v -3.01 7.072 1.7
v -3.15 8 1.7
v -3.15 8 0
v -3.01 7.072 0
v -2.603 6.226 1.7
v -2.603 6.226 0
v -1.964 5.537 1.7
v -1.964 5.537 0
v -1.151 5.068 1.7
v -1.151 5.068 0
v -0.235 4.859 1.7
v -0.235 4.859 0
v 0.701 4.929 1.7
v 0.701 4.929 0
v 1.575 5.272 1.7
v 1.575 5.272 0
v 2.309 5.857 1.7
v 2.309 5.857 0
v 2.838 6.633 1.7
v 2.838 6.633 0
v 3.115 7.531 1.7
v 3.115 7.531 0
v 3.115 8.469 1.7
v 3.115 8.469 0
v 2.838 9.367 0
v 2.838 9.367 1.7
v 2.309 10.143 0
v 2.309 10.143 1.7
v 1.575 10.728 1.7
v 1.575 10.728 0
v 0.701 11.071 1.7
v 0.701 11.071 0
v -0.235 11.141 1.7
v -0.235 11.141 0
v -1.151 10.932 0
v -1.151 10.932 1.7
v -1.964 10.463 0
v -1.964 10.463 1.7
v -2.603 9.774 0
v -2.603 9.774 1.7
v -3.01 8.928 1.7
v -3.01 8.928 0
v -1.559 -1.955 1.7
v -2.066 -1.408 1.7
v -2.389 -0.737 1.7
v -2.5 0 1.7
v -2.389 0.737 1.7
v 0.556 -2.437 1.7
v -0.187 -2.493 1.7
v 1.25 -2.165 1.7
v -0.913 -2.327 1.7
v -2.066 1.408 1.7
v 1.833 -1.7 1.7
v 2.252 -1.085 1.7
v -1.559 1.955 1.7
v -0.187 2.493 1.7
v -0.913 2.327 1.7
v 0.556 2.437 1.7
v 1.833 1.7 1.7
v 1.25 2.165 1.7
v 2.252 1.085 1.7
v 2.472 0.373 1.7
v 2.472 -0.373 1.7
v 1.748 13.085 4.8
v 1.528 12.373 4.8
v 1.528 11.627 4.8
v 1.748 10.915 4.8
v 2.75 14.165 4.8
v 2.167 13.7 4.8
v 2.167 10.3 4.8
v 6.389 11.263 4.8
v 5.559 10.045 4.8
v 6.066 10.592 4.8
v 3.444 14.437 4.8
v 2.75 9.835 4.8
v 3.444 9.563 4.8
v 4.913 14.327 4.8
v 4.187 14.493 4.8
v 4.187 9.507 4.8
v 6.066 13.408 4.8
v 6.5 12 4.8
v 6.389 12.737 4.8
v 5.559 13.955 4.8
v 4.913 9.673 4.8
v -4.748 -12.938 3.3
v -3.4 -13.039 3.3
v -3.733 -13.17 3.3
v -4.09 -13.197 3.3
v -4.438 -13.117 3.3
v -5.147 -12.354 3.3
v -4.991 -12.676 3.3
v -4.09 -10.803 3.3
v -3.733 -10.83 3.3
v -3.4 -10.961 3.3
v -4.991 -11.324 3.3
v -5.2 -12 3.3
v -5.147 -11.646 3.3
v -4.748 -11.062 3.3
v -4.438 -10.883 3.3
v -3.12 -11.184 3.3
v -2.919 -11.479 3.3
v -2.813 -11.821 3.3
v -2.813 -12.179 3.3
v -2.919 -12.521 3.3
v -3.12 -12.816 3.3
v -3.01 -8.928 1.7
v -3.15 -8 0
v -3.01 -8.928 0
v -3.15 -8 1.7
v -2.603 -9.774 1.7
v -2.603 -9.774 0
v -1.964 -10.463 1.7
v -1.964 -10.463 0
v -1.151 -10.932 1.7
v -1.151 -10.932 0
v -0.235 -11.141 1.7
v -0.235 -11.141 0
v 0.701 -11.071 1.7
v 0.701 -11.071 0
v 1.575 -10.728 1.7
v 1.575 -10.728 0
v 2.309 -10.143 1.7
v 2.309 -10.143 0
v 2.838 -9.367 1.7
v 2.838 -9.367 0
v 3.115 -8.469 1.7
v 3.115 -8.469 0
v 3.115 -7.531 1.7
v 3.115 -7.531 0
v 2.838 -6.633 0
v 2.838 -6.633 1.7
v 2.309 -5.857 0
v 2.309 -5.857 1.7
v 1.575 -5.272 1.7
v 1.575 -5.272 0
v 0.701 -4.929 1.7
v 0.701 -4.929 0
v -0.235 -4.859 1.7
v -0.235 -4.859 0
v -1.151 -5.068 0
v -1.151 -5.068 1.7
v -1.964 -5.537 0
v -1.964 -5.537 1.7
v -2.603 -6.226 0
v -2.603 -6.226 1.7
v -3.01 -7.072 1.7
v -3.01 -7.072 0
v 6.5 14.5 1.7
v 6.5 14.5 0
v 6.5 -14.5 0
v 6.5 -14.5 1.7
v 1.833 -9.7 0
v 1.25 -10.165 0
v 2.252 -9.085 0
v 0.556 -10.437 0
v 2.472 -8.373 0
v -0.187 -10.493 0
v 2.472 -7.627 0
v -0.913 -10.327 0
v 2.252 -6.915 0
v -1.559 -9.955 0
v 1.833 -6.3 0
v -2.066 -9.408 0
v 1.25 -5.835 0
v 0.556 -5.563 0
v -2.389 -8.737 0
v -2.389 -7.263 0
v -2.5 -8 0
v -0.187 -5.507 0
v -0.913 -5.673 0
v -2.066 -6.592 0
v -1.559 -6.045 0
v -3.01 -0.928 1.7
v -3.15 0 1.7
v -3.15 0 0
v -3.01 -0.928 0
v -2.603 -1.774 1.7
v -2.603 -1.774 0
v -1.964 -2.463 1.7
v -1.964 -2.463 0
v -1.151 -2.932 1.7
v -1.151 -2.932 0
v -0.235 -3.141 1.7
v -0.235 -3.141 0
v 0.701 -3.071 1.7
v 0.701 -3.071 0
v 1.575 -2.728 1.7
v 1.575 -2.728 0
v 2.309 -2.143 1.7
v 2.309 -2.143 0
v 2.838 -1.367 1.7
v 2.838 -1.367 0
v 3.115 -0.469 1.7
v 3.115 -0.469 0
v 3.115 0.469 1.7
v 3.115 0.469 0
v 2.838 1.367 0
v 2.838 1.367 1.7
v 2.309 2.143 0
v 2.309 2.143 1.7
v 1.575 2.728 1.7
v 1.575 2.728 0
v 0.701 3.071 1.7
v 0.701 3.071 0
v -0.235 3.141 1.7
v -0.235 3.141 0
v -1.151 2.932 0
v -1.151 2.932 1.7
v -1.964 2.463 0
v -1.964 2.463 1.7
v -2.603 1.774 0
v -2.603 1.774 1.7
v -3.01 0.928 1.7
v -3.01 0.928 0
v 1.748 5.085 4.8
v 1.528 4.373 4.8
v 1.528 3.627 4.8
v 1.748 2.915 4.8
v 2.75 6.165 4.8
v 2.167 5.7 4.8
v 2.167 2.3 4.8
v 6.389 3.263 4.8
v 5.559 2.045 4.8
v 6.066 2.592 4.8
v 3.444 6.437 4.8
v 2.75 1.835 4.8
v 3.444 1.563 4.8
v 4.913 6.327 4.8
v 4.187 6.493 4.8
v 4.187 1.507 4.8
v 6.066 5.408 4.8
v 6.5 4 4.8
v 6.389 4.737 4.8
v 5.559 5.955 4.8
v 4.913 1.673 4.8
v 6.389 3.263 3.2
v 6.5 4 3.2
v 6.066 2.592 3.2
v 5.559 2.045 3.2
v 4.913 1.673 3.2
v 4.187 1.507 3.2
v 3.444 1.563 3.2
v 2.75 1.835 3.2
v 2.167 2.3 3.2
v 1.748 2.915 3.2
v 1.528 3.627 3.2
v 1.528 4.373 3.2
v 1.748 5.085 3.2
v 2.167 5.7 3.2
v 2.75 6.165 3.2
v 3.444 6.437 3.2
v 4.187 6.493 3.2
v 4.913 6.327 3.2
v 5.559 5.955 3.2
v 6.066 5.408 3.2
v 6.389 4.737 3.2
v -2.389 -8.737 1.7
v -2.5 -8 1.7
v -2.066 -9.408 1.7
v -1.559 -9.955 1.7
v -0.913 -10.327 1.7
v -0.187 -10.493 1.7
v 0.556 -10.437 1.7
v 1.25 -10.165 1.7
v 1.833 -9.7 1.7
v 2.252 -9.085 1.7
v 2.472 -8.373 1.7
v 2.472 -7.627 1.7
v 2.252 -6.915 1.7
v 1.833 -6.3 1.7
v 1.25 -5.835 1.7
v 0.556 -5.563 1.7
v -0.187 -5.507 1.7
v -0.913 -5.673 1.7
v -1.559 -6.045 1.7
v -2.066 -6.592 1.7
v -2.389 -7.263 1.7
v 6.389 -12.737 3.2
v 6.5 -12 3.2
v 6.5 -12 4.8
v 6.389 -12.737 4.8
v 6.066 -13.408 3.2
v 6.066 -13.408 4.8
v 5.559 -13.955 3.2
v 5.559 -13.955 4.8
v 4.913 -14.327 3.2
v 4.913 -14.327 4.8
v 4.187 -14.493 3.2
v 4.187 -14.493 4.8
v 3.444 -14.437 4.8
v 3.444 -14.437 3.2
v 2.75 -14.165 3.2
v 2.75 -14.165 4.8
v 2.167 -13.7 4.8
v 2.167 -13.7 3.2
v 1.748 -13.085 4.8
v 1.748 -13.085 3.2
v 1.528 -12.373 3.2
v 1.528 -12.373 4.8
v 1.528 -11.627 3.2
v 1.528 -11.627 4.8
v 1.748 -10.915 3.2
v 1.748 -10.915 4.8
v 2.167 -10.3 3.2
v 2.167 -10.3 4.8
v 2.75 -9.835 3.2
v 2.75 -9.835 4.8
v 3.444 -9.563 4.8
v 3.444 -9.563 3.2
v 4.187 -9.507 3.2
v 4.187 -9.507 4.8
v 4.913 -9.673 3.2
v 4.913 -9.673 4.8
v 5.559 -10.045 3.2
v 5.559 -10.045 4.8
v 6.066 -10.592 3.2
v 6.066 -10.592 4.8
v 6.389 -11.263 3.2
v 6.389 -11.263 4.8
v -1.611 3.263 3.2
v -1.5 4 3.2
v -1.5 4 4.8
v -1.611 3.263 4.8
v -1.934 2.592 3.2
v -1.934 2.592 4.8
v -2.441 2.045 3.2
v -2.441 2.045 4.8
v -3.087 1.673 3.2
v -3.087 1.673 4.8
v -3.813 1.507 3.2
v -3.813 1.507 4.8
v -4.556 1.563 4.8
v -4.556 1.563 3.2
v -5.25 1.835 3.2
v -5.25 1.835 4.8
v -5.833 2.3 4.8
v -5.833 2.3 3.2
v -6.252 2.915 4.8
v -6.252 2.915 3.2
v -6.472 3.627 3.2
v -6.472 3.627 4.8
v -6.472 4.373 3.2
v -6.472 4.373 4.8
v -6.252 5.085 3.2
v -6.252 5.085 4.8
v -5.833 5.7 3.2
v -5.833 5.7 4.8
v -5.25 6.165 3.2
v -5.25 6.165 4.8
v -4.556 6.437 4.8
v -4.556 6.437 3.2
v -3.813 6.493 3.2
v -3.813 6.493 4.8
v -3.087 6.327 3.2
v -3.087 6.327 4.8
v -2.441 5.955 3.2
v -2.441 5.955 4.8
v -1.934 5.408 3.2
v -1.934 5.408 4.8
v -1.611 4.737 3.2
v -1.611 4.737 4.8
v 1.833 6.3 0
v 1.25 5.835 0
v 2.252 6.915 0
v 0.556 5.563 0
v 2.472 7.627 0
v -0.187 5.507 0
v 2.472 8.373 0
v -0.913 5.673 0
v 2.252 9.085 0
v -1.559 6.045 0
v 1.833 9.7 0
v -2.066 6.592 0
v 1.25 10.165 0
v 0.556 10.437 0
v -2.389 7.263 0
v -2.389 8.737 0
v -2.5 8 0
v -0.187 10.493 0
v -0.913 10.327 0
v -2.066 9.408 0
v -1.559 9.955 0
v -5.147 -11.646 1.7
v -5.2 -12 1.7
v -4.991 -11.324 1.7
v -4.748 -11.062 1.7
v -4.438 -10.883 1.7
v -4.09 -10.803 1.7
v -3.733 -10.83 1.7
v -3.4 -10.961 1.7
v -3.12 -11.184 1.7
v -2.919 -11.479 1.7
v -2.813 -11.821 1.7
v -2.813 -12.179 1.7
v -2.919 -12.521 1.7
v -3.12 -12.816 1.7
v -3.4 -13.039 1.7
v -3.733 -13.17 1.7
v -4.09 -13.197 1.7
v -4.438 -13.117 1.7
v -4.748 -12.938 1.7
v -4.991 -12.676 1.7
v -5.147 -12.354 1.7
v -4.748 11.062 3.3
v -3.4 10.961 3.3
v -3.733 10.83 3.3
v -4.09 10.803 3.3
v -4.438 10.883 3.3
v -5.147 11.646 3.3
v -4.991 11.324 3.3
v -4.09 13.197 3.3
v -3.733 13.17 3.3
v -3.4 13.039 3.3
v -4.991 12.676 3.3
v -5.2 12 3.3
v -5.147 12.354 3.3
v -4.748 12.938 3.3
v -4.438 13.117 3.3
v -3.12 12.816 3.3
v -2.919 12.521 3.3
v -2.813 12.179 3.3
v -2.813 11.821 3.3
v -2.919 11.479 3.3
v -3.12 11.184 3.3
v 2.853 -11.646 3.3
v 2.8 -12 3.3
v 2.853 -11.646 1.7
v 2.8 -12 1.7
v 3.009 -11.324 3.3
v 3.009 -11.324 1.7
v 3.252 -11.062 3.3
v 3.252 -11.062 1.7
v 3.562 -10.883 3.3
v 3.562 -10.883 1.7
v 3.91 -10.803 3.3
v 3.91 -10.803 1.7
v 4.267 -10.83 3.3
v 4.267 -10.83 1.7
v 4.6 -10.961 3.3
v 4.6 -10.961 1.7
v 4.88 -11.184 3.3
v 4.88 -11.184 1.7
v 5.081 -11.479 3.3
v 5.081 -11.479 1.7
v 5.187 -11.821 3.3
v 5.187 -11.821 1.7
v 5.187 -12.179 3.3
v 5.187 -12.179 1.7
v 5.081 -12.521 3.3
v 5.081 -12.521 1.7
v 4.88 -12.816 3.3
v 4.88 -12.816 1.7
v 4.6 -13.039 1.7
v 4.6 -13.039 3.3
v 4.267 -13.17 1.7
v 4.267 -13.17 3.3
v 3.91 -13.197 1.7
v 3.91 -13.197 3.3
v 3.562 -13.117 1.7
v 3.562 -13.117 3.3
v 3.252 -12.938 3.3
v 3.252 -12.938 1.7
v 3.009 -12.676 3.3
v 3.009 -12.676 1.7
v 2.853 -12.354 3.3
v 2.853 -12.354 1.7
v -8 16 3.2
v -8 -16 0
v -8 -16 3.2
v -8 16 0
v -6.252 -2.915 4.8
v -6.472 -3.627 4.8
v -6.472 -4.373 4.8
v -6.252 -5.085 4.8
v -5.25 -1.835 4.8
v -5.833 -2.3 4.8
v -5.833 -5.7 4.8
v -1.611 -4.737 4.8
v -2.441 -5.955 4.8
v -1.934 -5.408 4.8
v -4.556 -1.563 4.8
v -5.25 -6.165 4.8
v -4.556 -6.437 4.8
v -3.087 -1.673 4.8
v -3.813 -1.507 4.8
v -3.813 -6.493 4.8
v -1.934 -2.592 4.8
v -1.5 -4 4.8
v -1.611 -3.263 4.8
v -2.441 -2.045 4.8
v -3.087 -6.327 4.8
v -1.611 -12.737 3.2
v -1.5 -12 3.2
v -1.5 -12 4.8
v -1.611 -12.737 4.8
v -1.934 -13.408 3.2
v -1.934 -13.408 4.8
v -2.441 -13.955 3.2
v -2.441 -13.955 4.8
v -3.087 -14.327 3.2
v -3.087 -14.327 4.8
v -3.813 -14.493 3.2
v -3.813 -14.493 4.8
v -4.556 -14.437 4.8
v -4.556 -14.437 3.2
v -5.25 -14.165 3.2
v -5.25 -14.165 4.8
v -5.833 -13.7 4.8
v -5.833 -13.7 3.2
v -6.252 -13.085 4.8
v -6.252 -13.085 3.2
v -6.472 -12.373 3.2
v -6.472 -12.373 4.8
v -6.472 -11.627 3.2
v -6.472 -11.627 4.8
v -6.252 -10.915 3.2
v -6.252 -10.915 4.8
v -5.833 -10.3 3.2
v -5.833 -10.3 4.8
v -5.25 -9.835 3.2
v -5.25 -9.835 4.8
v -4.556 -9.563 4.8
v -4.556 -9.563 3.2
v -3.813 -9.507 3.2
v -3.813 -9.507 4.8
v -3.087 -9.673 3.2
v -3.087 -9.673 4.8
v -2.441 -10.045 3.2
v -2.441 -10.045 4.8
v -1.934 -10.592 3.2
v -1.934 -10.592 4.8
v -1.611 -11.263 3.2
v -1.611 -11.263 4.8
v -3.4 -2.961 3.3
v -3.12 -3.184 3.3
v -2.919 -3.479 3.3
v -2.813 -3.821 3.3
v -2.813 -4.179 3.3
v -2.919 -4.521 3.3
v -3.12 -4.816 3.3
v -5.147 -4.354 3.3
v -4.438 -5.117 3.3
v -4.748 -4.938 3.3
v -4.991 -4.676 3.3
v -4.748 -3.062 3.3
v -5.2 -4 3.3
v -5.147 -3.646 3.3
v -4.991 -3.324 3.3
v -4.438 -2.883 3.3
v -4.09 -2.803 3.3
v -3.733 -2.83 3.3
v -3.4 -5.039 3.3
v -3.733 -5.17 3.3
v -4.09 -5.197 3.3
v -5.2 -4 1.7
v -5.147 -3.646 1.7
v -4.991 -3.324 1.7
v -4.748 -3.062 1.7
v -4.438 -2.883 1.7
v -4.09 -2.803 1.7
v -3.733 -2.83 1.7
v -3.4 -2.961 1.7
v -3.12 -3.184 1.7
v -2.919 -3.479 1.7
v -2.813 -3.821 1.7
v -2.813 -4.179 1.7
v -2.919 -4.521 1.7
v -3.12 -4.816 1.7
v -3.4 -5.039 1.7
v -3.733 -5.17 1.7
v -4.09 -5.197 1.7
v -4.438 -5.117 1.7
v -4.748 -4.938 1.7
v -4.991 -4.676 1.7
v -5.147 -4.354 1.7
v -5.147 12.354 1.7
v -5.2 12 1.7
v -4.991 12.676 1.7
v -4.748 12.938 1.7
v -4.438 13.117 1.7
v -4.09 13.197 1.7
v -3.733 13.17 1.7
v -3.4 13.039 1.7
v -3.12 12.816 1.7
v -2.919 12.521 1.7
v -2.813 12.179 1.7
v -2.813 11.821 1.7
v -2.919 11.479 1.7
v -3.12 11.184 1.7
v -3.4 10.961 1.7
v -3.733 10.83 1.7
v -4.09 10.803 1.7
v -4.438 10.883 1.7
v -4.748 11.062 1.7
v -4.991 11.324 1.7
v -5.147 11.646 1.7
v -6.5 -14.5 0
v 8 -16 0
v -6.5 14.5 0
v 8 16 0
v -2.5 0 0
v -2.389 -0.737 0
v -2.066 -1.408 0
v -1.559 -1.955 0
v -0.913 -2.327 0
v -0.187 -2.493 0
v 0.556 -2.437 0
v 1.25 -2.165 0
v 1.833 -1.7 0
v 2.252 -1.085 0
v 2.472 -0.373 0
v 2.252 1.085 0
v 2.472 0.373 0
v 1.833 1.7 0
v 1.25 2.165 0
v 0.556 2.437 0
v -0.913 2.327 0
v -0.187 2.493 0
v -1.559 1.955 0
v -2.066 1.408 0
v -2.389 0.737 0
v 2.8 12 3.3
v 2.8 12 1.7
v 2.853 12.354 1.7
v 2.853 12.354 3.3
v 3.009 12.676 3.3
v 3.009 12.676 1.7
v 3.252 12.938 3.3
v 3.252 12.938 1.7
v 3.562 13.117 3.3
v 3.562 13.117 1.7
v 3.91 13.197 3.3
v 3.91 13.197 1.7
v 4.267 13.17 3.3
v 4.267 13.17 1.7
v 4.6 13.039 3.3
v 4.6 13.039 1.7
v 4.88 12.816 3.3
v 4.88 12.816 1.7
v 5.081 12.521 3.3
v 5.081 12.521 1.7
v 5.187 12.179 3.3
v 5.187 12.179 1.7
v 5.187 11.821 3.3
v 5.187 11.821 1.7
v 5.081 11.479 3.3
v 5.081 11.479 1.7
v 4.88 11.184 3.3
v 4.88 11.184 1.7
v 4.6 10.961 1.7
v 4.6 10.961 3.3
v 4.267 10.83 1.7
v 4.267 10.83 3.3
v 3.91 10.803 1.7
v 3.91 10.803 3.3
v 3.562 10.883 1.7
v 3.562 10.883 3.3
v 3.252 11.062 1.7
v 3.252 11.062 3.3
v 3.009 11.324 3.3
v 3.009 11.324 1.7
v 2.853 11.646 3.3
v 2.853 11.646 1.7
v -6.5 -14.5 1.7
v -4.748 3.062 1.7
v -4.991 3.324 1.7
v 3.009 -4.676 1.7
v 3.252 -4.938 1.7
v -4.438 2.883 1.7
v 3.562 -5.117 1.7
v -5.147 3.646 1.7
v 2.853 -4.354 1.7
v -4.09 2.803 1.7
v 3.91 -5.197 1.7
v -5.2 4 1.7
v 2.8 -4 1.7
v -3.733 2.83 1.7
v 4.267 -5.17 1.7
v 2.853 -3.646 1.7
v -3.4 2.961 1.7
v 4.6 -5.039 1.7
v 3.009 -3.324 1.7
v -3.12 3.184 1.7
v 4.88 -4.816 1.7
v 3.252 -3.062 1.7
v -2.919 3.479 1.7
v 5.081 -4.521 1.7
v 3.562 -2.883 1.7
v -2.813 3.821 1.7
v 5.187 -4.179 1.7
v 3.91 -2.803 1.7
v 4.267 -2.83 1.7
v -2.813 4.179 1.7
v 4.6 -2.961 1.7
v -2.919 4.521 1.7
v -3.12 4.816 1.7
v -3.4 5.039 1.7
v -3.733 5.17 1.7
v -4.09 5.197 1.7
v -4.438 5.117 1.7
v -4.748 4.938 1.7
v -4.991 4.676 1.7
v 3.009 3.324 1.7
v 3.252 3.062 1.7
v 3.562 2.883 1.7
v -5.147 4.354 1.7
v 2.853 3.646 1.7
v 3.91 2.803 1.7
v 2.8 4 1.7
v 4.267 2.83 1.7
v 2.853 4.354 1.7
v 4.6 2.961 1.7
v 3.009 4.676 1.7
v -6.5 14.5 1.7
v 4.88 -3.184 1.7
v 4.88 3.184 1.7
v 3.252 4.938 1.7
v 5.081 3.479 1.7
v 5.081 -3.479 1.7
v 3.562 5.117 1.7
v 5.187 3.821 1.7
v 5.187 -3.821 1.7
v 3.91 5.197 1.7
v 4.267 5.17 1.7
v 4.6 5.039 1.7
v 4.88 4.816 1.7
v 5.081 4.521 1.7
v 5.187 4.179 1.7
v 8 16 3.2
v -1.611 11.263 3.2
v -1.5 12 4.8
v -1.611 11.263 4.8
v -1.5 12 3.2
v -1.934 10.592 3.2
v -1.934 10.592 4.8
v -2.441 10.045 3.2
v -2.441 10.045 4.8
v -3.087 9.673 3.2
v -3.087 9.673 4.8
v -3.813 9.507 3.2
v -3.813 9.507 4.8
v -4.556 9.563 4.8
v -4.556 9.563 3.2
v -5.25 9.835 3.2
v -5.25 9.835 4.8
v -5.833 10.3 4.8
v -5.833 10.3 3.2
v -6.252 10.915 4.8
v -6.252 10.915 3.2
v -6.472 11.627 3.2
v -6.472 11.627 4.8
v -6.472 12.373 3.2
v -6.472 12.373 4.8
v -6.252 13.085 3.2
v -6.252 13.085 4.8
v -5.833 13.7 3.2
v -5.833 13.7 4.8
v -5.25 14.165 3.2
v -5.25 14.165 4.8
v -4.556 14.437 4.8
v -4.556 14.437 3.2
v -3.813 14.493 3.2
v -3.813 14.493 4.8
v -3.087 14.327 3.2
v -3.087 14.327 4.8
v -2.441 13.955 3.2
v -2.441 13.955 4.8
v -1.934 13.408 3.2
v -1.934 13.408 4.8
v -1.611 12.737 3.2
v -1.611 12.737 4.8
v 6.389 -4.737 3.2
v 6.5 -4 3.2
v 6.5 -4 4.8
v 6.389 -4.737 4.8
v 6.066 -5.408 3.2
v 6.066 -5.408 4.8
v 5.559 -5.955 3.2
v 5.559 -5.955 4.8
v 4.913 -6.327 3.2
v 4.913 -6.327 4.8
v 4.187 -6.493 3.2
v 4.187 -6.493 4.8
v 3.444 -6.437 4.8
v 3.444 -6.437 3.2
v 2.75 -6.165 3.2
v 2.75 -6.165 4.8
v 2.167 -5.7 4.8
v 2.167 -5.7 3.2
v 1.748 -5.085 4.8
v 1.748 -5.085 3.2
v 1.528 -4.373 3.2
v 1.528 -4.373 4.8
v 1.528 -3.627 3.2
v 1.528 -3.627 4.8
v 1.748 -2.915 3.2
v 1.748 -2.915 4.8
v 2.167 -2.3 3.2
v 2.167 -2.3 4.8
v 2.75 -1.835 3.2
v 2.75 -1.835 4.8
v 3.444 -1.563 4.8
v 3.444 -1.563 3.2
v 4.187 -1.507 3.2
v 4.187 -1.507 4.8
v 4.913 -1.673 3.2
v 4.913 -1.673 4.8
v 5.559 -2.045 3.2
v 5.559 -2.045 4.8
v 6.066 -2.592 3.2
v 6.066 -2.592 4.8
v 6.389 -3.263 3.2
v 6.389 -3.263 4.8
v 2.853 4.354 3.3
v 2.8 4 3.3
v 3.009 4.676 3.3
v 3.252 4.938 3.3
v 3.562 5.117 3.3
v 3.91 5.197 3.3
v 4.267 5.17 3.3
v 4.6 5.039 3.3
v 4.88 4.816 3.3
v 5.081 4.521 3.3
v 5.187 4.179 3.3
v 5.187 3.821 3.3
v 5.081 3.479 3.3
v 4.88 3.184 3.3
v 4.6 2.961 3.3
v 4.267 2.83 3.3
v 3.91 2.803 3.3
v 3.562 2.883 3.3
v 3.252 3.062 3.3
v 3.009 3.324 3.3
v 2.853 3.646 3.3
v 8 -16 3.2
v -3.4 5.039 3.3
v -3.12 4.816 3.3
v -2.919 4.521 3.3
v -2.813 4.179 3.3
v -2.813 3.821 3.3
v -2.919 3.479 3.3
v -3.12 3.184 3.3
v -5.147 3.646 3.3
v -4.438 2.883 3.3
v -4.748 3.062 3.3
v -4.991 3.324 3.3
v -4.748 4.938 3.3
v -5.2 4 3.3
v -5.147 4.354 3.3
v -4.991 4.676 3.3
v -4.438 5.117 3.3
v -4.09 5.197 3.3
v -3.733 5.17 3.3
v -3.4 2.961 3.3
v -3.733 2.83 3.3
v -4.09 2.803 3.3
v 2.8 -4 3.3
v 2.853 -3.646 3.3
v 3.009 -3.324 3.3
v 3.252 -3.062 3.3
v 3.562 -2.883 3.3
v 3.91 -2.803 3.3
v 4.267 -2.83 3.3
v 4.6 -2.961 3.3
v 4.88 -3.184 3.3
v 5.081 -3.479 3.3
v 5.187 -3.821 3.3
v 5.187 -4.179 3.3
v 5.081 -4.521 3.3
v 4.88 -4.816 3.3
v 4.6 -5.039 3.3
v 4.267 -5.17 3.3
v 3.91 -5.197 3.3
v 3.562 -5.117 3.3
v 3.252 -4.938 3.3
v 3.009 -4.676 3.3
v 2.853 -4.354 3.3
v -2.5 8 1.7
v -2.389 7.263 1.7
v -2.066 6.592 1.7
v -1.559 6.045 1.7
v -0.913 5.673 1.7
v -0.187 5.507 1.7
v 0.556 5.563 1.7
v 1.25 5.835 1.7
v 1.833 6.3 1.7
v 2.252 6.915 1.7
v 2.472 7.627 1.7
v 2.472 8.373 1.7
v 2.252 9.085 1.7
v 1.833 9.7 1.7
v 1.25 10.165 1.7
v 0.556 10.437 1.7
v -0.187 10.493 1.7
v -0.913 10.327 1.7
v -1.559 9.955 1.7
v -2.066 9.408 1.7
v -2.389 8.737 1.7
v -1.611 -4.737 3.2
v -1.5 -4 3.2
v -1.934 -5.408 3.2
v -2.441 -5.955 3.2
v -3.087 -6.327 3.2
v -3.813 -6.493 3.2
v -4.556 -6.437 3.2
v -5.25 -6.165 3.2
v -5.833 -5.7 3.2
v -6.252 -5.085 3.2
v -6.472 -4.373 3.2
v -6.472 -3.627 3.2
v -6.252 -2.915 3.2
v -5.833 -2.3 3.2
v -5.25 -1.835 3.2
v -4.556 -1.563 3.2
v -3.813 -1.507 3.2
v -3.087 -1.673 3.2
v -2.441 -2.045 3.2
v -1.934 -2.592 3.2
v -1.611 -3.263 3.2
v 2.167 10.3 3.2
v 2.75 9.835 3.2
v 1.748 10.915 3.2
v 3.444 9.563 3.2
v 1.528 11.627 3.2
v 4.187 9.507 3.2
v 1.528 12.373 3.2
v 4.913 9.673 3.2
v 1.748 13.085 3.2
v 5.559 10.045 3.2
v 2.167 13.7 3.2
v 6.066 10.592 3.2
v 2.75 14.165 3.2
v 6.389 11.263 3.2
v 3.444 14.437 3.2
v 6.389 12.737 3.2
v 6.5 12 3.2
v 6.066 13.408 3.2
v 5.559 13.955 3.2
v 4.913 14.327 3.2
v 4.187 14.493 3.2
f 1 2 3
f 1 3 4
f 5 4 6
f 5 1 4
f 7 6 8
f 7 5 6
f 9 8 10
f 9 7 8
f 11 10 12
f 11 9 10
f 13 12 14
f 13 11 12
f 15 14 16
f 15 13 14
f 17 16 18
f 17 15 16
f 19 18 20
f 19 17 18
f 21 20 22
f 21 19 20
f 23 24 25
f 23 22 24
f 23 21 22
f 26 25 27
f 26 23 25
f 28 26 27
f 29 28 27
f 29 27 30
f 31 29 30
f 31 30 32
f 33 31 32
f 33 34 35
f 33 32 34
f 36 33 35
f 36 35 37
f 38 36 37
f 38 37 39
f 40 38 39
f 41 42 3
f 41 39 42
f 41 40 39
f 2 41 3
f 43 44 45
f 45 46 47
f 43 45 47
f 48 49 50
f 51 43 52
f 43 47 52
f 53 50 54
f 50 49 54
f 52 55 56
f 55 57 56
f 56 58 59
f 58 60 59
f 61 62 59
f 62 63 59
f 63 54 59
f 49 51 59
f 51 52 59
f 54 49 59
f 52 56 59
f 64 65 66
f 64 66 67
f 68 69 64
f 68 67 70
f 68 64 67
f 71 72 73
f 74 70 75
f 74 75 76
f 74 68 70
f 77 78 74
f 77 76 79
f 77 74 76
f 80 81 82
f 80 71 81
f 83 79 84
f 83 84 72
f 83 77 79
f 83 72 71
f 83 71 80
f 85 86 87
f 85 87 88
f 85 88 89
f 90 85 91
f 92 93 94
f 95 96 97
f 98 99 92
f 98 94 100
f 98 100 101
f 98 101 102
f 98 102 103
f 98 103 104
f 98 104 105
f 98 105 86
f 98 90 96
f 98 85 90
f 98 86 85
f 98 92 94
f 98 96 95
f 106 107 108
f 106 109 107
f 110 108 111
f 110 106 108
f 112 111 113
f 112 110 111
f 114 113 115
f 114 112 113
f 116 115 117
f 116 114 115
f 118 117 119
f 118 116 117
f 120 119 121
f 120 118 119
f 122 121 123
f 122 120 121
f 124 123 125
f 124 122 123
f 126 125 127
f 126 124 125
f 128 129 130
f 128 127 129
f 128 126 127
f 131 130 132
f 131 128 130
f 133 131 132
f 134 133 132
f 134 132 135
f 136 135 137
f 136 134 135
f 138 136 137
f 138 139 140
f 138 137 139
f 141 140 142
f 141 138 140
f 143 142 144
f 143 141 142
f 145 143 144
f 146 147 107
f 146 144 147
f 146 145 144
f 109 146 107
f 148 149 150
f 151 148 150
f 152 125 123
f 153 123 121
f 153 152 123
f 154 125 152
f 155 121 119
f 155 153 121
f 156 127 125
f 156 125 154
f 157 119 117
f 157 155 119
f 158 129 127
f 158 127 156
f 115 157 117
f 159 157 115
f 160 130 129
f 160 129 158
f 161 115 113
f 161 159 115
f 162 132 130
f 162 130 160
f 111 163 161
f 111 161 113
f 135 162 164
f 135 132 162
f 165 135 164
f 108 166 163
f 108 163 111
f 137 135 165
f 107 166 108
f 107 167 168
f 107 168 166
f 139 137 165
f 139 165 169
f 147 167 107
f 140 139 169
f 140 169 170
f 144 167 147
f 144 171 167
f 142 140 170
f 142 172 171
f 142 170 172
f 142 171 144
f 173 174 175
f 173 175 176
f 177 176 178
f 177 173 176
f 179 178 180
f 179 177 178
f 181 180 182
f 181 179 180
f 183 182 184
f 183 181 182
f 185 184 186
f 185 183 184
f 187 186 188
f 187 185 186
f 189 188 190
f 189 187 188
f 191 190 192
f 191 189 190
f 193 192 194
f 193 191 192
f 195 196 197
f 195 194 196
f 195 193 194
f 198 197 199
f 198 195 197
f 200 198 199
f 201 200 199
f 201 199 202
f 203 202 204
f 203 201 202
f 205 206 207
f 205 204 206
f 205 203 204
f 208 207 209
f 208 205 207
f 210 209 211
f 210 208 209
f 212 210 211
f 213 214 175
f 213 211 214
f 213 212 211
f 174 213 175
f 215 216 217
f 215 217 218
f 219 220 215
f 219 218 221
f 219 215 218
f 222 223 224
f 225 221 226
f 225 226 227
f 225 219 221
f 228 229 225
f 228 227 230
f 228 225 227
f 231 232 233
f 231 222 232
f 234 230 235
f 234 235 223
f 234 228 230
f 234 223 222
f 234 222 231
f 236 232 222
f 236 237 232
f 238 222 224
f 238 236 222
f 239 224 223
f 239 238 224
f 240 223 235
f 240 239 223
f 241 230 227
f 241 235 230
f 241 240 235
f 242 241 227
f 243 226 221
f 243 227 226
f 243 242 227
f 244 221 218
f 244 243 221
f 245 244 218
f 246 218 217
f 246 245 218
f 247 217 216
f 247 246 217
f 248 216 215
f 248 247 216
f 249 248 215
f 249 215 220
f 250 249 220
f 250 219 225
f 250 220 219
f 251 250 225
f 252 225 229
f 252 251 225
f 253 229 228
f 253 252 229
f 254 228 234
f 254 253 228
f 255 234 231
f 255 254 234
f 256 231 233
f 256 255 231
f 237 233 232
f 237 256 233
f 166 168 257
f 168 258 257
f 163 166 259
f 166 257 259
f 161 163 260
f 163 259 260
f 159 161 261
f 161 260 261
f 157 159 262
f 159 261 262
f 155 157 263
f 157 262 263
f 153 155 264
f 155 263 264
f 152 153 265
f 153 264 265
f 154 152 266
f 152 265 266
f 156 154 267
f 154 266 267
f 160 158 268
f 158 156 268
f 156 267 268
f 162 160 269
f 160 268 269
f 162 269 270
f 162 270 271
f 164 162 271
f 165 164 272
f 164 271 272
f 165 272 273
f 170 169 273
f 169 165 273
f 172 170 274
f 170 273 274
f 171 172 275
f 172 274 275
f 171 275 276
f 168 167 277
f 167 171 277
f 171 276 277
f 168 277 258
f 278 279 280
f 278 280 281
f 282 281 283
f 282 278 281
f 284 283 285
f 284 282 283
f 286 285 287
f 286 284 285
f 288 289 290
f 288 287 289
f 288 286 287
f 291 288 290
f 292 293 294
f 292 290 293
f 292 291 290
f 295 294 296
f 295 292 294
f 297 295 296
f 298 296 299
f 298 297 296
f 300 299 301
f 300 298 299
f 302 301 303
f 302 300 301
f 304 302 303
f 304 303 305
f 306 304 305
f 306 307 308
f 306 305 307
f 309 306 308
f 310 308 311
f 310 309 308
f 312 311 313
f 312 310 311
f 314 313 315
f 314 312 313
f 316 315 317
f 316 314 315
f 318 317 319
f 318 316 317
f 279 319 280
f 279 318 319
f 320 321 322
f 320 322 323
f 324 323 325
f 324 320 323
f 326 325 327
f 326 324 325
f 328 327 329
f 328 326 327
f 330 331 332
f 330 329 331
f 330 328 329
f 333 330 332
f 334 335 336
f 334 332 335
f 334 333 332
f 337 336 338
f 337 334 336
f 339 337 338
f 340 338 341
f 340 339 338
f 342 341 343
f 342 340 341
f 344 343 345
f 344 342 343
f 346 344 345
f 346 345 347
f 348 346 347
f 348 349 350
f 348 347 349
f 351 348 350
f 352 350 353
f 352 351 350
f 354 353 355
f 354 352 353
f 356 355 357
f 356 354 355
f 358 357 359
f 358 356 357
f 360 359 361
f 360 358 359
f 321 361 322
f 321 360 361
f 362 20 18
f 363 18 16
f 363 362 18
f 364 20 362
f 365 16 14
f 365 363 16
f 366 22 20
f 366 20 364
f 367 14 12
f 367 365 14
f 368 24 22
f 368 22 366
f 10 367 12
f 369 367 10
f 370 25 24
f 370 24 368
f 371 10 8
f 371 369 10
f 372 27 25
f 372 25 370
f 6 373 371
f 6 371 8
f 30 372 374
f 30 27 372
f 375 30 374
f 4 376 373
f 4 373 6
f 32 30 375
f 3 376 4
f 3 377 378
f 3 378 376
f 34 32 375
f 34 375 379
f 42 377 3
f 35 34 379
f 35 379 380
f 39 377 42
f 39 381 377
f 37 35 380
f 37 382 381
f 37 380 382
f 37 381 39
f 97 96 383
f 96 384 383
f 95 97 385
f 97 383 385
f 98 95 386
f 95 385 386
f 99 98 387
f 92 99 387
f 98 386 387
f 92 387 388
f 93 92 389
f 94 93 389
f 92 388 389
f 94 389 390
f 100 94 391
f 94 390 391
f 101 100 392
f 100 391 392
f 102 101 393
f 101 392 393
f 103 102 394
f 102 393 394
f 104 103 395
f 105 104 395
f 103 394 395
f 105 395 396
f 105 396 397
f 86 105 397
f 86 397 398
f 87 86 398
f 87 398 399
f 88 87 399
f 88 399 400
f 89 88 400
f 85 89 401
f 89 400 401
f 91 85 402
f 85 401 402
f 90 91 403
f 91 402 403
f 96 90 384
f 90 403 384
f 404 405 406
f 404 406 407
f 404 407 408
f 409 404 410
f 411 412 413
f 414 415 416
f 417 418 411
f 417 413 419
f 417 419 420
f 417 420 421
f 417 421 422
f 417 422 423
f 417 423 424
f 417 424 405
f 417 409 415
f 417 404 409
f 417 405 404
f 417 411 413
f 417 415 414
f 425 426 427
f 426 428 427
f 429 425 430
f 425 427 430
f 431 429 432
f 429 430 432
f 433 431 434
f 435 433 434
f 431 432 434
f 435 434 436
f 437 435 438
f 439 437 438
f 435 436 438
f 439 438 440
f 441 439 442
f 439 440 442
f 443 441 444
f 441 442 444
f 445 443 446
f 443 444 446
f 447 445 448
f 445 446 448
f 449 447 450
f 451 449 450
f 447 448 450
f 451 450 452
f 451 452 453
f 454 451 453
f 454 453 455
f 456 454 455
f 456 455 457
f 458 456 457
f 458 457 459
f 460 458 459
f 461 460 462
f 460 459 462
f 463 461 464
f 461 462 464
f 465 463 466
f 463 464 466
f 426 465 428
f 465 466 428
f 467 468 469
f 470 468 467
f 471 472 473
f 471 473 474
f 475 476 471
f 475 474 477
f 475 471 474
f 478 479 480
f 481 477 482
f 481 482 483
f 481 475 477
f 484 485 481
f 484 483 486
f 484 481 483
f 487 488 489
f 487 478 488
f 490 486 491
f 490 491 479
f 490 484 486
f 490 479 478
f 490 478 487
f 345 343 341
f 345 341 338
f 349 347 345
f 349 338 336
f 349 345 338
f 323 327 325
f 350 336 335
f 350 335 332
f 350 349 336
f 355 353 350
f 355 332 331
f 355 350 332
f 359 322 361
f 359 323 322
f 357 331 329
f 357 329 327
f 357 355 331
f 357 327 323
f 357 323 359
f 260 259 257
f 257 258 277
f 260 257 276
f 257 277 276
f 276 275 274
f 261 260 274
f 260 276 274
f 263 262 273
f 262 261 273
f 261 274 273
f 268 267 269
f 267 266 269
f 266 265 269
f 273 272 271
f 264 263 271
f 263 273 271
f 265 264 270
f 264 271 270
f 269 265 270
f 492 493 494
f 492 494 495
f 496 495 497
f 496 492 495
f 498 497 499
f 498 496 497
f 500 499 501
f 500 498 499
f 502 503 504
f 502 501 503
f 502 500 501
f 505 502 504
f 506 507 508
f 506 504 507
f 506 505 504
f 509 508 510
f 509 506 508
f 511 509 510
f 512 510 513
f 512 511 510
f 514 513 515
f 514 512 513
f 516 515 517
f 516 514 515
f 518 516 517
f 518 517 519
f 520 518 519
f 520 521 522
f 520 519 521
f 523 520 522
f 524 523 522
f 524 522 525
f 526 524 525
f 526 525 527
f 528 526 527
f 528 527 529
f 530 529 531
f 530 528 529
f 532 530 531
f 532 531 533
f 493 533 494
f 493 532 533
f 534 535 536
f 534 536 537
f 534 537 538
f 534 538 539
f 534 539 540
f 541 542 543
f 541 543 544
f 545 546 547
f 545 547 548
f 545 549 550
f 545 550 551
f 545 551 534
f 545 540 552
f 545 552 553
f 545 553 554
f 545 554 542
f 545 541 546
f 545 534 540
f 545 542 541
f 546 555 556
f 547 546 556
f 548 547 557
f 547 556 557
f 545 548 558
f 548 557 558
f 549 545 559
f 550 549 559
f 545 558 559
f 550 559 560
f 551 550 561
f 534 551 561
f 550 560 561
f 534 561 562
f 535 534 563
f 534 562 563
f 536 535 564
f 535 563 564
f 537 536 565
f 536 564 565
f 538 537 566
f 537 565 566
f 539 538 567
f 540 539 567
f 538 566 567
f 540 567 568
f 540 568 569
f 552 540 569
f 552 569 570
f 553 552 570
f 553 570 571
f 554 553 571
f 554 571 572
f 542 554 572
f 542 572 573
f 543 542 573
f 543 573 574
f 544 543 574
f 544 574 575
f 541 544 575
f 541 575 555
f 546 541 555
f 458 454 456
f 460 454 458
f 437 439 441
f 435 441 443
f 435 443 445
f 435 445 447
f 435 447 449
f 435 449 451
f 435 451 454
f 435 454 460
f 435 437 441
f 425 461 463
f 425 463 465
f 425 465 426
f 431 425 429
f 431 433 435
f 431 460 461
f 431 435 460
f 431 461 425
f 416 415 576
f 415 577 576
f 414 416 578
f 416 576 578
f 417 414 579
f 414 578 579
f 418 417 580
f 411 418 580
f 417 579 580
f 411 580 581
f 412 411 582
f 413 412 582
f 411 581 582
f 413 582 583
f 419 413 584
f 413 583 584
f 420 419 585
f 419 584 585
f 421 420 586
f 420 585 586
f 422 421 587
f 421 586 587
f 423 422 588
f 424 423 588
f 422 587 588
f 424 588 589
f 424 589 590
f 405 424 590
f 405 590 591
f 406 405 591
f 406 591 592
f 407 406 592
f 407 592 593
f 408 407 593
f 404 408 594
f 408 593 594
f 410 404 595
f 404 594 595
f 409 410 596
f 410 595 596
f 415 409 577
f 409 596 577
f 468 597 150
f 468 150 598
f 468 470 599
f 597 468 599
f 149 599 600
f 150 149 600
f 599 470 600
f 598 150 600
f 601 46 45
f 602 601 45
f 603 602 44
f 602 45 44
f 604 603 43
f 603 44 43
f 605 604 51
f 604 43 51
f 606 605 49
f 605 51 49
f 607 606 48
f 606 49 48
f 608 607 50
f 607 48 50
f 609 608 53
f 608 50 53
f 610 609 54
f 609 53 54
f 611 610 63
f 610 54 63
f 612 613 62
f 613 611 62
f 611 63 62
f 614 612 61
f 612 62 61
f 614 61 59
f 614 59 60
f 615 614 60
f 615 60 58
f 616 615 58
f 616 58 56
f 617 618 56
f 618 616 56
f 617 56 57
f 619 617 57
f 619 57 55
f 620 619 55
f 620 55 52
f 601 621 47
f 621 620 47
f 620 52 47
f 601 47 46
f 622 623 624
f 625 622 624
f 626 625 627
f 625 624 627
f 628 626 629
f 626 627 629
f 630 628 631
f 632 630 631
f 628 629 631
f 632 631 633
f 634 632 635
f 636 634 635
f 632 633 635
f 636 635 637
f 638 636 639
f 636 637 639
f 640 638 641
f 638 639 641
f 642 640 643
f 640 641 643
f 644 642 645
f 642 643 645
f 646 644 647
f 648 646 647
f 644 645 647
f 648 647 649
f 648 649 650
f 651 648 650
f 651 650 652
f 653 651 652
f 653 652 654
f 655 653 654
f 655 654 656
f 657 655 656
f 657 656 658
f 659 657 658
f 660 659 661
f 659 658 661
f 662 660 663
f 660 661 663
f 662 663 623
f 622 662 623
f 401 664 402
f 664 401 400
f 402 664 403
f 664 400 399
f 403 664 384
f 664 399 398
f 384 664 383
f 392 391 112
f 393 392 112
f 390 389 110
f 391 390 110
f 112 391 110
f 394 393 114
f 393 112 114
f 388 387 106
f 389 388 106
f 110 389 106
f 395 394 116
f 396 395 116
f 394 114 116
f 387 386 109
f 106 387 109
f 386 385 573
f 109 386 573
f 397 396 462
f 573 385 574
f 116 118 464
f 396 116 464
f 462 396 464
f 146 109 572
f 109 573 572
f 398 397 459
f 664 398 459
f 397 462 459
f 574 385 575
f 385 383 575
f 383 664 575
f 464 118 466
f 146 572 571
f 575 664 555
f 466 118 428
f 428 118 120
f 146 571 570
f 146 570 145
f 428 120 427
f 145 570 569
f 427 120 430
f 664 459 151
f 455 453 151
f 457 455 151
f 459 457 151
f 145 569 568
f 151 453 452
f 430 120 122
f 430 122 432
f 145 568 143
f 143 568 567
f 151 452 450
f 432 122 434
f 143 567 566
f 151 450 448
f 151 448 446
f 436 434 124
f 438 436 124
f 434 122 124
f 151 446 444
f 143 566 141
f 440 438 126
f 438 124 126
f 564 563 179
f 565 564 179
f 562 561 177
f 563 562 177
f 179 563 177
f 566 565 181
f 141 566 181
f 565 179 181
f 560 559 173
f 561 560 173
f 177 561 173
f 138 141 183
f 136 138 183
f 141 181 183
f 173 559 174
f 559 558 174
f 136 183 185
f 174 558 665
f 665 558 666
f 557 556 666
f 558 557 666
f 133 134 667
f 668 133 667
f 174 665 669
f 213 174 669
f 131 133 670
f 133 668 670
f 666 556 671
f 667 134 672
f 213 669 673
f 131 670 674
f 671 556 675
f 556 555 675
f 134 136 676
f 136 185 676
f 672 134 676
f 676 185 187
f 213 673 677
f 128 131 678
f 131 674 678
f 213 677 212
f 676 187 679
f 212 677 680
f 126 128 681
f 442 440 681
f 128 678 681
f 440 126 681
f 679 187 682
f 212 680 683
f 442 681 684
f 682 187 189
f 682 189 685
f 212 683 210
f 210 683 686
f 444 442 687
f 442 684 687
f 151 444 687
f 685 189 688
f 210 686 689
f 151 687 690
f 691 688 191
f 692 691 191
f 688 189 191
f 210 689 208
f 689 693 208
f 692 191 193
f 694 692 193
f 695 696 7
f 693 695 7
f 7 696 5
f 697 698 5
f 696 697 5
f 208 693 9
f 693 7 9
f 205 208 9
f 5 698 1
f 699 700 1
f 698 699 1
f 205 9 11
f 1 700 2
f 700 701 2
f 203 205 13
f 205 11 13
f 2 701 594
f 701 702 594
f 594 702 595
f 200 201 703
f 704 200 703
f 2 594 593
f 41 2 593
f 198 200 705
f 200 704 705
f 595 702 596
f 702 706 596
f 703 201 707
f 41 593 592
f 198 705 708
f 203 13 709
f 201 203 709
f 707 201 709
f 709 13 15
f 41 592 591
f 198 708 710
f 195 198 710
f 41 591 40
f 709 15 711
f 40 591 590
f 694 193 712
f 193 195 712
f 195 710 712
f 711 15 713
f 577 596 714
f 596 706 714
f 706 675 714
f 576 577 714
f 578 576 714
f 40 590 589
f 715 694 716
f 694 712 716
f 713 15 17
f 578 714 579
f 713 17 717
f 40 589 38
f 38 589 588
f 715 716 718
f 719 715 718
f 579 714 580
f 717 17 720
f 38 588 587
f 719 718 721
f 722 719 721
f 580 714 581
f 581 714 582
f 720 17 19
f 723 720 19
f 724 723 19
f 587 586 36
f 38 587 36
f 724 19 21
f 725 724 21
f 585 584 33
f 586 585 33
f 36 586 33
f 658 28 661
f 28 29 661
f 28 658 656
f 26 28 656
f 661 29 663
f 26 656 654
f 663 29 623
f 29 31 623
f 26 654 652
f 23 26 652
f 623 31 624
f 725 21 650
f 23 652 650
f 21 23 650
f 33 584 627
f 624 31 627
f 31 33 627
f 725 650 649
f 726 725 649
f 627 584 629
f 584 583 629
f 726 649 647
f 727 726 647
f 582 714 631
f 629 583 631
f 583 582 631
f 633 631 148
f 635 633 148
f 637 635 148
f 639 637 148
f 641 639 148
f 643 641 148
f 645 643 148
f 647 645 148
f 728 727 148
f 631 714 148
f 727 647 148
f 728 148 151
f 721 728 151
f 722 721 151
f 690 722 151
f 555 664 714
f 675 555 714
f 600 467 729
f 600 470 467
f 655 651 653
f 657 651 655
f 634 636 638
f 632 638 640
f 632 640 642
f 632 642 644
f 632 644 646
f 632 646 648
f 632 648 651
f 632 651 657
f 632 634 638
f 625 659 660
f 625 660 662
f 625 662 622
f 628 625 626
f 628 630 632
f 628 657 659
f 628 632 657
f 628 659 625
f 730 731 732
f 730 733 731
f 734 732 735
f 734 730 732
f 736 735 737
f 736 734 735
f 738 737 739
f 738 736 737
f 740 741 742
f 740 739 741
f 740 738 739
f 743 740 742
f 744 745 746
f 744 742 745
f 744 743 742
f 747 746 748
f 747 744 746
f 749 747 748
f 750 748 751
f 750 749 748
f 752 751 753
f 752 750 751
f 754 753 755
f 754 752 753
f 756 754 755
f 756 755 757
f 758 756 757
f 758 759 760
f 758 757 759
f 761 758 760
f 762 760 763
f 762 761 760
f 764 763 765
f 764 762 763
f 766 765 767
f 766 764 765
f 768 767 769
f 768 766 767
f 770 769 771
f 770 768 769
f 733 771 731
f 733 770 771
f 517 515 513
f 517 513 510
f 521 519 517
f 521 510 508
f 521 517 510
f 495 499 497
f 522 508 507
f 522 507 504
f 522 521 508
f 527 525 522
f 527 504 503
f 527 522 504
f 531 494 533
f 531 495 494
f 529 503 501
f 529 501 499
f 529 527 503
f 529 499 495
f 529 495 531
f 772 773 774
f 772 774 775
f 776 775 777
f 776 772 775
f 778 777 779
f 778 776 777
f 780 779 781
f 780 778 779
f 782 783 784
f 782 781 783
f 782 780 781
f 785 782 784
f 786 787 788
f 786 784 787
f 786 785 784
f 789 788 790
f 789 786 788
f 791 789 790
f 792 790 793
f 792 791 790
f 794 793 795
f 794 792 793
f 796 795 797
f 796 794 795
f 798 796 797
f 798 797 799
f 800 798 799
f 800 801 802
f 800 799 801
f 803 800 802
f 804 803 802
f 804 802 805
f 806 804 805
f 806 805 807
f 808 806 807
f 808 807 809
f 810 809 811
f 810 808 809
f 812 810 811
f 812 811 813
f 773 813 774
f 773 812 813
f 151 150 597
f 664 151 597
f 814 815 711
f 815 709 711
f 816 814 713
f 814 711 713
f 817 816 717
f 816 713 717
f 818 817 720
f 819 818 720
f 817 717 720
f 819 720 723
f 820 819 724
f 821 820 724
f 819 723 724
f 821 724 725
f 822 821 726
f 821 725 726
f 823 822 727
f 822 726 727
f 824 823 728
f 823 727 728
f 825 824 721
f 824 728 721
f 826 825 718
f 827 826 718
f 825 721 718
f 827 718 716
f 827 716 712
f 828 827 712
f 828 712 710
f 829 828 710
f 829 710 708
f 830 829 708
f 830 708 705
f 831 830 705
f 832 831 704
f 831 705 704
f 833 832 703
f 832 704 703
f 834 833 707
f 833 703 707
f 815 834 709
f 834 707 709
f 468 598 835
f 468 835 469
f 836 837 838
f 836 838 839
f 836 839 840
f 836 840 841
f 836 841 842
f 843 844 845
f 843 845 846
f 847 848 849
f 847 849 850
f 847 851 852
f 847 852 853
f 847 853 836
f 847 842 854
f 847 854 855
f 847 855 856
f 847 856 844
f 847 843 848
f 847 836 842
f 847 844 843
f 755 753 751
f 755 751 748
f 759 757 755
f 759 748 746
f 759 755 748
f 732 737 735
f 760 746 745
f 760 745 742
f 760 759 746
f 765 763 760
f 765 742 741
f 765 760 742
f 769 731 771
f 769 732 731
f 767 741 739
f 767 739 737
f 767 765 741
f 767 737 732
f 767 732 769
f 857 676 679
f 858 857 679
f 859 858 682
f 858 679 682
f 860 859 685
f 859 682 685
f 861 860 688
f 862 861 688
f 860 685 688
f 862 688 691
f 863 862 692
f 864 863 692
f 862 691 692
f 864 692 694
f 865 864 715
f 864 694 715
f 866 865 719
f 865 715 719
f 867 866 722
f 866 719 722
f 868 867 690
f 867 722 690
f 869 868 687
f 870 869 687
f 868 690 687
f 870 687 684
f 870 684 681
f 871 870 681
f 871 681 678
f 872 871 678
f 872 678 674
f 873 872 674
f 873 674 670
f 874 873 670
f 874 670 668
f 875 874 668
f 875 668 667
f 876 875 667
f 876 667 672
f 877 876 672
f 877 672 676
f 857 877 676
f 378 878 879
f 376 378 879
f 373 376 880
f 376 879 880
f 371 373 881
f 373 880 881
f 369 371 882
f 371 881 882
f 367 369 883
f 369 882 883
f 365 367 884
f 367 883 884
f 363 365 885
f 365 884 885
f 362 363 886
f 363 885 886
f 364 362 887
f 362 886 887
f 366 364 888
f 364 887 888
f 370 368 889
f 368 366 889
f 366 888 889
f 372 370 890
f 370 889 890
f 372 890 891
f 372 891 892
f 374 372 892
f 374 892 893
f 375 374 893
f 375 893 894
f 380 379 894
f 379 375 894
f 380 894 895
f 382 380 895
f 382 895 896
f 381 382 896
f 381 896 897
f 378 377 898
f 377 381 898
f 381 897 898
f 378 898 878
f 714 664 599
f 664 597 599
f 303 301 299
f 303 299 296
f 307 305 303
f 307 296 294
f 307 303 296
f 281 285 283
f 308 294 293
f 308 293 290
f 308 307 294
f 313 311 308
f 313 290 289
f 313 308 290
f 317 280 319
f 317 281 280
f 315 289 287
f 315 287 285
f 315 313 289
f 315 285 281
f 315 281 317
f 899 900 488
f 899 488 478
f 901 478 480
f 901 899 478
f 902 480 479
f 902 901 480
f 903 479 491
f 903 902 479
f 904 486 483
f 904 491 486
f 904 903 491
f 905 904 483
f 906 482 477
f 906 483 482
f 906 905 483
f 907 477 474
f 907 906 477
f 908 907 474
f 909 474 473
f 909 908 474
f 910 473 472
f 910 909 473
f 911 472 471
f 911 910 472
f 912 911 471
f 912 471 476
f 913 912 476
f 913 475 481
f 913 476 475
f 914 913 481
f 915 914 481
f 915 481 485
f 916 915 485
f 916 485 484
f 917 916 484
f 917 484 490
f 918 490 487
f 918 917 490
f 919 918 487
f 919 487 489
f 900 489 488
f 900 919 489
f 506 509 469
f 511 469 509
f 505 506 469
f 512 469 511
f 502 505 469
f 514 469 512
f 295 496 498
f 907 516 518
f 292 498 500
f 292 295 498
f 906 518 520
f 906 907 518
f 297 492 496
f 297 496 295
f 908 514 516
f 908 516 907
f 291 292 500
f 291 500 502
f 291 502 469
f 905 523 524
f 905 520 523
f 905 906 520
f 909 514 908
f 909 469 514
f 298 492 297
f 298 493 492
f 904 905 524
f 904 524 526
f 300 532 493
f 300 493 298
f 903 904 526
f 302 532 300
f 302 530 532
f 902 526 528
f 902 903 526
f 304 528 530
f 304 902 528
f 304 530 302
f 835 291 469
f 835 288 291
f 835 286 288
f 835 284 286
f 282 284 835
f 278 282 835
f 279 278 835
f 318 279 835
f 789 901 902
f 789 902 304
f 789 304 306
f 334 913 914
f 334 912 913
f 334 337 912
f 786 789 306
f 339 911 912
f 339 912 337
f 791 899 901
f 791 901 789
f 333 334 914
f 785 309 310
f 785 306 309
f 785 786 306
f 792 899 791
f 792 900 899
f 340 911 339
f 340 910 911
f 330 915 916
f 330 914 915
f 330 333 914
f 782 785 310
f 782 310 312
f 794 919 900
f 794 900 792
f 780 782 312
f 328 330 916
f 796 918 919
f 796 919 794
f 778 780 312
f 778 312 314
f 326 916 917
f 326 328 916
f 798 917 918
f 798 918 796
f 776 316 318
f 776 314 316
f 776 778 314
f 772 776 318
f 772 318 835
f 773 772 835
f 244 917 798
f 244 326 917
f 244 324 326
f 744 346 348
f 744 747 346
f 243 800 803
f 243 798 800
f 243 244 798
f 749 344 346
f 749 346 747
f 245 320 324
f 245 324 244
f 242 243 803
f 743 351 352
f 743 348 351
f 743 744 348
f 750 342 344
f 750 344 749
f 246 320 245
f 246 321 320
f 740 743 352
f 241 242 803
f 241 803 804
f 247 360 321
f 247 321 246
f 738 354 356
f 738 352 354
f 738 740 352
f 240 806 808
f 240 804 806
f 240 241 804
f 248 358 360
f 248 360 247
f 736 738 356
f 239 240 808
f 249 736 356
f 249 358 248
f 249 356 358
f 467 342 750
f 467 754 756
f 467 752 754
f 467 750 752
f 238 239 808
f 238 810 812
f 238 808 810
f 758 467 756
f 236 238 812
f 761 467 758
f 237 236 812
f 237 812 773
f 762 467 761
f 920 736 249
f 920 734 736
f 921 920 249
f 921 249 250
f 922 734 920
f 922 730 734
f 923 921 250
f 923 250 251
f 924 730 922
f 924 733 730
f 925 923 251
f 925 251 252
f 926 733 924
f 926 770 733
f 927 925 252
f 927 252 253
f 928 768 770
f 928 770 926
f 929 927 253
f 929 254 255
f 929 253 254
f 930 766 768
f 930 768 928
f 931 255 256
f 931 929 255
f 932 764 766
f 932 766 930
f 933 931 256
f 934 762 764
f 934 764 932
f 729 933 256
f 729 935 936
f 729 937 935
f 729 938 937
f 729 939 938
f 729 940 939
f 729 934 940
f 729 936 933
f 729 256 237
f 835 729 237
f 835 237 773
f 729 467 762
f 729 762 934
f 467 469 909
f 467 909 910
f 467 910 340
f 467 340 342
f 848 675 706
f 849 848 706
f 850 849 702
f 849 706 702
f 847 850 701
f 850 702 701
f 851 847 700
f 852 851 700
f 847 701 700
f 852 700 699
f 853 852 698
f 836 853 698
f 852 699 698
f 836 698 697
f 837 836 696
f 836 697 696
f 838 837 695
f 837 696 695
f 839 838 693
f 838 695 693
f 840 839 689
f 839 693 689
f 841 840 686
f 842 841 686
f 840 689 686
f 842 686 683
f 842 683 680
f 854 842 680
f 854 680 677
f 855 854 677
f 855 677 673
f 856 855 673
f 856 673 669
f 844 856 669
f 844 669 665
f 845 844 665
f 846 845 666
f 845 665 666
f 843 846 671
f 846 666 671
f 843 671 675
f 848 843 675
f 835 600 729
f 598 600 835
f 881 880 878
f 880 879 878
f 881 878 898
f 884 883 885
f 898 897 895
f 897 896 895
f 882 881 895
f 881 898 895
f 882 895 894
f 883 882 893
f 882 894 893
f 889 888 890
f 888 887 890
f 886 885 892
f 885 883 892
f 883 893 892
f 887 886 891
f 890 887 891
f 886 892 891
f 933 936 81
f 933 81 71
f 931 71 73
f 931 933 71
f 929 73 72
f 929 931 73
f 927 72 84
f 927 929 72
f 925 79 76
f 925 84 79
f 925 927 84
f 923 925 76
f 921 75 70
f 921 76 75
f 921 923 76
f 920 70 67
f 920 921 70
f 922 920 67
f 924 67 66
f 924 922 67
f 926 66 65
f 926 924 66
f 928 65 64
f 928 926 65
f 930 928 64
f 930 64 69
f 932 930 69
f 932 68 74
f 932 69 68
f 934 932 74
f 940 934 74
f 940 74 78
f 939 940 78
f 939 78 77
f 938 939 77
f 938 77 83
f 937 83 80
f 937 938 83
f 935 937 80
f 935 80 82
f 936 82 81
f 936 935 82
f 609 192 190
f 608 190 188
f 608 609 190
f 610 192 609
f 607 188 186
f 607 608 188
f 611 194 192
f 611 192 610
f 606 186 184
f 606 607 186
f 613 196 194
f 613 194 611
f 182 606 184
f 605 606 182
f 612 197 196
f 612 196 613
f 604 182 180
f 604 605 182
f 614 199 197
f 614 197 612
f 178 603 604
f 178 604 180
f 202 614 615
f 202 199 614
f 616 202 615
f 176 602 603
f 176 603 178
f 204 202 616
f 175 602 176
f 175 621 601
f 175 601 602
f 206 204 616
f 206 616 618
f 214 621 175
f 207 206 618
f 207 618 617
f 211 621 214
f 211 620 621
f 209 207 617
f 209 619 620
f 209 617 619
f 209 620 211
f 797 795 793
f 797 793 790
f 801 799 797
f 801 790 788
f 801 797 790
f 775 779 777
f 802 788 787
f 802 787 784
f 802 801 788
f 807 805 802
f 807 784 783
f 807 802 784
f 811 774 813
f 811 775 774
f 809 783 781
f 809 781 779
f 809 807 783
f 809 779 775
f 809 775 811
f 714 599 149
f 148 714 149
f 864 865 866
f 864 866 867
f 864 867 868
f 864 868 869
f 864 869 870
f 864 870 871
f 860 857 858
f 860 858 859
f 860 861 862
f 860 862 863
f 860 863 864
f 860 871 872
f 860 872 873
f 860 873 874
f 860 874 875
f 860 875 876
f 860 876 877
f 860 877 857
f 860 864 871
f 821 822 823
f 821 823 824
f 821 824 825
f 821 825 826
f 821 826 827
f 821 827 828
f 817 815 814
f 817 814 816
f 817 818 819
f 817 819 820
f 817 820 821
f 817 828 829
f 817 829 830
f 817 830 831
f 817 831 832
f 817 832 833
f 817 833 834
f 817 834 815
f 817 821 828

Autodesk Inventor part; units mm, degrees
ref_plane "YZ Plane" through (0, 0, 0) normal (1, 0, 0) x (0, 1, 0)
ref_plane "XZ Plane" through (0, 0, 0) normal (0, 1, 0) x (-1, 0, 0)
ref_plane "XY Plane" through (0, 0, 0) normal (0, 0, 1) x (1, 0, 0)
sketch "Sketch1" plane through (0, 0, 0) normal (0, 0, 1) x (1, 0, 0)
  line L0 (-8, 16) -> (8, 16)
  line L1 (8, 16) -> (8, -16)
  line L2 (8, -16) -> (-8, -16)
  line L3 (-8, -16) -> (-8, 16)
  point P0 (0, 0)
  dimension "d0" = 16
  dimension "d1" = 32
  dimension "d2" = 8
  dimension "d3" = 16
extrude "Extrusion1" add sketch "Sketch1" along normal blind 3.2
shell "Shell1" thickness 1.5 removed faces 1 at (2.6667, 5.3333, 0)
sketch "Sketch2" plane through (0, 0, 3.2) normal (0, 0, 1) x (1, 0, 0)
  circle A0 centre (4, -12) radius 2.5
  line L0 (8, 16) -> (8, -16) projected
  line L1 (8, -16) -> (-8, -16) projected
  dimension "d7" = 5
  dimension "d10" = 4
  dimension "d11" = 4
extrude "Extrusion2" add sketch "Sketch2" along normal blind 1.6
sketch "Sketch3" plane through (6.5, -14.5, 1.7) normal (0, 0, -1) x (-1, 0, 0)
  circle A0 centre (2.5, 2.5) radius 2.5 projected
  circle A1 centre (2.5, 2.5) radius 1.2
  point P0 (6.5, 14.5)
  dimension "d18" = 2.4
extrude "Extrusion3" cut sketch "Sketch3" against normal blind 1.6 contours A1
pattern_linear "Rectangular Pattern1" count 4 spacing 8 along (0, 1, 0) count 2 spacing 8 along (-1, 0, 0) of "Extrusion2", "Extrusion3"
sketch "Sketch4" plane through (6.5, -14.5, 1.7) normal (0, 0, -1) x (-1, 0, 0)
  circle A0 centre (2.5, 10.5) radius 1.2 projected
  circle A1 centre (2.5, 2.5) radius 1.2 projected
  line L0 (0, 29) -> (0, 0) projected
  line L1 (0, 0) -> (13, 0) projected
  circle A2 centre (6.5, 6.5) radius 3.15
  circle A3 centre (6.5, 6.5) radius 2.5
  point P0 (6.5, 14.5)
  dimension "d21" = 6.5
  dimension "d22" = 6.5
  dimension "d23" = 10.5
  dimension "d24" = 2.5
  dimension "d25" = 5
  dimension "d26" = 6.3
extrude "Extrusion4" add sketch "Sketch4" along normal up to surface (1.7 mm away) contours A2
pattern_linear "Rectangular Pattern2" count 3 spacing 8 along (0, 1, 0) of "Extrusion4"
equation "\"d0\" = 8 * WIDTH"
equation "\"d1\" = 8 * LENGTH"
equation "\"d2\" = 0.5 * d0"
equation "\"d3\" = 0.5 * d1"
equation "\"d4\" = HEIGHT"
equation "\"d21\" = 0.5 * d23 + 0.5 * d24"
equation "\"d22\" = d21"
equation "\"WIDTH\" = 2"
equation "\"HEIGHT\" = 3.2"
equation "\"LENGTH\" = 4"
properties part number "3020" material "Steel"
